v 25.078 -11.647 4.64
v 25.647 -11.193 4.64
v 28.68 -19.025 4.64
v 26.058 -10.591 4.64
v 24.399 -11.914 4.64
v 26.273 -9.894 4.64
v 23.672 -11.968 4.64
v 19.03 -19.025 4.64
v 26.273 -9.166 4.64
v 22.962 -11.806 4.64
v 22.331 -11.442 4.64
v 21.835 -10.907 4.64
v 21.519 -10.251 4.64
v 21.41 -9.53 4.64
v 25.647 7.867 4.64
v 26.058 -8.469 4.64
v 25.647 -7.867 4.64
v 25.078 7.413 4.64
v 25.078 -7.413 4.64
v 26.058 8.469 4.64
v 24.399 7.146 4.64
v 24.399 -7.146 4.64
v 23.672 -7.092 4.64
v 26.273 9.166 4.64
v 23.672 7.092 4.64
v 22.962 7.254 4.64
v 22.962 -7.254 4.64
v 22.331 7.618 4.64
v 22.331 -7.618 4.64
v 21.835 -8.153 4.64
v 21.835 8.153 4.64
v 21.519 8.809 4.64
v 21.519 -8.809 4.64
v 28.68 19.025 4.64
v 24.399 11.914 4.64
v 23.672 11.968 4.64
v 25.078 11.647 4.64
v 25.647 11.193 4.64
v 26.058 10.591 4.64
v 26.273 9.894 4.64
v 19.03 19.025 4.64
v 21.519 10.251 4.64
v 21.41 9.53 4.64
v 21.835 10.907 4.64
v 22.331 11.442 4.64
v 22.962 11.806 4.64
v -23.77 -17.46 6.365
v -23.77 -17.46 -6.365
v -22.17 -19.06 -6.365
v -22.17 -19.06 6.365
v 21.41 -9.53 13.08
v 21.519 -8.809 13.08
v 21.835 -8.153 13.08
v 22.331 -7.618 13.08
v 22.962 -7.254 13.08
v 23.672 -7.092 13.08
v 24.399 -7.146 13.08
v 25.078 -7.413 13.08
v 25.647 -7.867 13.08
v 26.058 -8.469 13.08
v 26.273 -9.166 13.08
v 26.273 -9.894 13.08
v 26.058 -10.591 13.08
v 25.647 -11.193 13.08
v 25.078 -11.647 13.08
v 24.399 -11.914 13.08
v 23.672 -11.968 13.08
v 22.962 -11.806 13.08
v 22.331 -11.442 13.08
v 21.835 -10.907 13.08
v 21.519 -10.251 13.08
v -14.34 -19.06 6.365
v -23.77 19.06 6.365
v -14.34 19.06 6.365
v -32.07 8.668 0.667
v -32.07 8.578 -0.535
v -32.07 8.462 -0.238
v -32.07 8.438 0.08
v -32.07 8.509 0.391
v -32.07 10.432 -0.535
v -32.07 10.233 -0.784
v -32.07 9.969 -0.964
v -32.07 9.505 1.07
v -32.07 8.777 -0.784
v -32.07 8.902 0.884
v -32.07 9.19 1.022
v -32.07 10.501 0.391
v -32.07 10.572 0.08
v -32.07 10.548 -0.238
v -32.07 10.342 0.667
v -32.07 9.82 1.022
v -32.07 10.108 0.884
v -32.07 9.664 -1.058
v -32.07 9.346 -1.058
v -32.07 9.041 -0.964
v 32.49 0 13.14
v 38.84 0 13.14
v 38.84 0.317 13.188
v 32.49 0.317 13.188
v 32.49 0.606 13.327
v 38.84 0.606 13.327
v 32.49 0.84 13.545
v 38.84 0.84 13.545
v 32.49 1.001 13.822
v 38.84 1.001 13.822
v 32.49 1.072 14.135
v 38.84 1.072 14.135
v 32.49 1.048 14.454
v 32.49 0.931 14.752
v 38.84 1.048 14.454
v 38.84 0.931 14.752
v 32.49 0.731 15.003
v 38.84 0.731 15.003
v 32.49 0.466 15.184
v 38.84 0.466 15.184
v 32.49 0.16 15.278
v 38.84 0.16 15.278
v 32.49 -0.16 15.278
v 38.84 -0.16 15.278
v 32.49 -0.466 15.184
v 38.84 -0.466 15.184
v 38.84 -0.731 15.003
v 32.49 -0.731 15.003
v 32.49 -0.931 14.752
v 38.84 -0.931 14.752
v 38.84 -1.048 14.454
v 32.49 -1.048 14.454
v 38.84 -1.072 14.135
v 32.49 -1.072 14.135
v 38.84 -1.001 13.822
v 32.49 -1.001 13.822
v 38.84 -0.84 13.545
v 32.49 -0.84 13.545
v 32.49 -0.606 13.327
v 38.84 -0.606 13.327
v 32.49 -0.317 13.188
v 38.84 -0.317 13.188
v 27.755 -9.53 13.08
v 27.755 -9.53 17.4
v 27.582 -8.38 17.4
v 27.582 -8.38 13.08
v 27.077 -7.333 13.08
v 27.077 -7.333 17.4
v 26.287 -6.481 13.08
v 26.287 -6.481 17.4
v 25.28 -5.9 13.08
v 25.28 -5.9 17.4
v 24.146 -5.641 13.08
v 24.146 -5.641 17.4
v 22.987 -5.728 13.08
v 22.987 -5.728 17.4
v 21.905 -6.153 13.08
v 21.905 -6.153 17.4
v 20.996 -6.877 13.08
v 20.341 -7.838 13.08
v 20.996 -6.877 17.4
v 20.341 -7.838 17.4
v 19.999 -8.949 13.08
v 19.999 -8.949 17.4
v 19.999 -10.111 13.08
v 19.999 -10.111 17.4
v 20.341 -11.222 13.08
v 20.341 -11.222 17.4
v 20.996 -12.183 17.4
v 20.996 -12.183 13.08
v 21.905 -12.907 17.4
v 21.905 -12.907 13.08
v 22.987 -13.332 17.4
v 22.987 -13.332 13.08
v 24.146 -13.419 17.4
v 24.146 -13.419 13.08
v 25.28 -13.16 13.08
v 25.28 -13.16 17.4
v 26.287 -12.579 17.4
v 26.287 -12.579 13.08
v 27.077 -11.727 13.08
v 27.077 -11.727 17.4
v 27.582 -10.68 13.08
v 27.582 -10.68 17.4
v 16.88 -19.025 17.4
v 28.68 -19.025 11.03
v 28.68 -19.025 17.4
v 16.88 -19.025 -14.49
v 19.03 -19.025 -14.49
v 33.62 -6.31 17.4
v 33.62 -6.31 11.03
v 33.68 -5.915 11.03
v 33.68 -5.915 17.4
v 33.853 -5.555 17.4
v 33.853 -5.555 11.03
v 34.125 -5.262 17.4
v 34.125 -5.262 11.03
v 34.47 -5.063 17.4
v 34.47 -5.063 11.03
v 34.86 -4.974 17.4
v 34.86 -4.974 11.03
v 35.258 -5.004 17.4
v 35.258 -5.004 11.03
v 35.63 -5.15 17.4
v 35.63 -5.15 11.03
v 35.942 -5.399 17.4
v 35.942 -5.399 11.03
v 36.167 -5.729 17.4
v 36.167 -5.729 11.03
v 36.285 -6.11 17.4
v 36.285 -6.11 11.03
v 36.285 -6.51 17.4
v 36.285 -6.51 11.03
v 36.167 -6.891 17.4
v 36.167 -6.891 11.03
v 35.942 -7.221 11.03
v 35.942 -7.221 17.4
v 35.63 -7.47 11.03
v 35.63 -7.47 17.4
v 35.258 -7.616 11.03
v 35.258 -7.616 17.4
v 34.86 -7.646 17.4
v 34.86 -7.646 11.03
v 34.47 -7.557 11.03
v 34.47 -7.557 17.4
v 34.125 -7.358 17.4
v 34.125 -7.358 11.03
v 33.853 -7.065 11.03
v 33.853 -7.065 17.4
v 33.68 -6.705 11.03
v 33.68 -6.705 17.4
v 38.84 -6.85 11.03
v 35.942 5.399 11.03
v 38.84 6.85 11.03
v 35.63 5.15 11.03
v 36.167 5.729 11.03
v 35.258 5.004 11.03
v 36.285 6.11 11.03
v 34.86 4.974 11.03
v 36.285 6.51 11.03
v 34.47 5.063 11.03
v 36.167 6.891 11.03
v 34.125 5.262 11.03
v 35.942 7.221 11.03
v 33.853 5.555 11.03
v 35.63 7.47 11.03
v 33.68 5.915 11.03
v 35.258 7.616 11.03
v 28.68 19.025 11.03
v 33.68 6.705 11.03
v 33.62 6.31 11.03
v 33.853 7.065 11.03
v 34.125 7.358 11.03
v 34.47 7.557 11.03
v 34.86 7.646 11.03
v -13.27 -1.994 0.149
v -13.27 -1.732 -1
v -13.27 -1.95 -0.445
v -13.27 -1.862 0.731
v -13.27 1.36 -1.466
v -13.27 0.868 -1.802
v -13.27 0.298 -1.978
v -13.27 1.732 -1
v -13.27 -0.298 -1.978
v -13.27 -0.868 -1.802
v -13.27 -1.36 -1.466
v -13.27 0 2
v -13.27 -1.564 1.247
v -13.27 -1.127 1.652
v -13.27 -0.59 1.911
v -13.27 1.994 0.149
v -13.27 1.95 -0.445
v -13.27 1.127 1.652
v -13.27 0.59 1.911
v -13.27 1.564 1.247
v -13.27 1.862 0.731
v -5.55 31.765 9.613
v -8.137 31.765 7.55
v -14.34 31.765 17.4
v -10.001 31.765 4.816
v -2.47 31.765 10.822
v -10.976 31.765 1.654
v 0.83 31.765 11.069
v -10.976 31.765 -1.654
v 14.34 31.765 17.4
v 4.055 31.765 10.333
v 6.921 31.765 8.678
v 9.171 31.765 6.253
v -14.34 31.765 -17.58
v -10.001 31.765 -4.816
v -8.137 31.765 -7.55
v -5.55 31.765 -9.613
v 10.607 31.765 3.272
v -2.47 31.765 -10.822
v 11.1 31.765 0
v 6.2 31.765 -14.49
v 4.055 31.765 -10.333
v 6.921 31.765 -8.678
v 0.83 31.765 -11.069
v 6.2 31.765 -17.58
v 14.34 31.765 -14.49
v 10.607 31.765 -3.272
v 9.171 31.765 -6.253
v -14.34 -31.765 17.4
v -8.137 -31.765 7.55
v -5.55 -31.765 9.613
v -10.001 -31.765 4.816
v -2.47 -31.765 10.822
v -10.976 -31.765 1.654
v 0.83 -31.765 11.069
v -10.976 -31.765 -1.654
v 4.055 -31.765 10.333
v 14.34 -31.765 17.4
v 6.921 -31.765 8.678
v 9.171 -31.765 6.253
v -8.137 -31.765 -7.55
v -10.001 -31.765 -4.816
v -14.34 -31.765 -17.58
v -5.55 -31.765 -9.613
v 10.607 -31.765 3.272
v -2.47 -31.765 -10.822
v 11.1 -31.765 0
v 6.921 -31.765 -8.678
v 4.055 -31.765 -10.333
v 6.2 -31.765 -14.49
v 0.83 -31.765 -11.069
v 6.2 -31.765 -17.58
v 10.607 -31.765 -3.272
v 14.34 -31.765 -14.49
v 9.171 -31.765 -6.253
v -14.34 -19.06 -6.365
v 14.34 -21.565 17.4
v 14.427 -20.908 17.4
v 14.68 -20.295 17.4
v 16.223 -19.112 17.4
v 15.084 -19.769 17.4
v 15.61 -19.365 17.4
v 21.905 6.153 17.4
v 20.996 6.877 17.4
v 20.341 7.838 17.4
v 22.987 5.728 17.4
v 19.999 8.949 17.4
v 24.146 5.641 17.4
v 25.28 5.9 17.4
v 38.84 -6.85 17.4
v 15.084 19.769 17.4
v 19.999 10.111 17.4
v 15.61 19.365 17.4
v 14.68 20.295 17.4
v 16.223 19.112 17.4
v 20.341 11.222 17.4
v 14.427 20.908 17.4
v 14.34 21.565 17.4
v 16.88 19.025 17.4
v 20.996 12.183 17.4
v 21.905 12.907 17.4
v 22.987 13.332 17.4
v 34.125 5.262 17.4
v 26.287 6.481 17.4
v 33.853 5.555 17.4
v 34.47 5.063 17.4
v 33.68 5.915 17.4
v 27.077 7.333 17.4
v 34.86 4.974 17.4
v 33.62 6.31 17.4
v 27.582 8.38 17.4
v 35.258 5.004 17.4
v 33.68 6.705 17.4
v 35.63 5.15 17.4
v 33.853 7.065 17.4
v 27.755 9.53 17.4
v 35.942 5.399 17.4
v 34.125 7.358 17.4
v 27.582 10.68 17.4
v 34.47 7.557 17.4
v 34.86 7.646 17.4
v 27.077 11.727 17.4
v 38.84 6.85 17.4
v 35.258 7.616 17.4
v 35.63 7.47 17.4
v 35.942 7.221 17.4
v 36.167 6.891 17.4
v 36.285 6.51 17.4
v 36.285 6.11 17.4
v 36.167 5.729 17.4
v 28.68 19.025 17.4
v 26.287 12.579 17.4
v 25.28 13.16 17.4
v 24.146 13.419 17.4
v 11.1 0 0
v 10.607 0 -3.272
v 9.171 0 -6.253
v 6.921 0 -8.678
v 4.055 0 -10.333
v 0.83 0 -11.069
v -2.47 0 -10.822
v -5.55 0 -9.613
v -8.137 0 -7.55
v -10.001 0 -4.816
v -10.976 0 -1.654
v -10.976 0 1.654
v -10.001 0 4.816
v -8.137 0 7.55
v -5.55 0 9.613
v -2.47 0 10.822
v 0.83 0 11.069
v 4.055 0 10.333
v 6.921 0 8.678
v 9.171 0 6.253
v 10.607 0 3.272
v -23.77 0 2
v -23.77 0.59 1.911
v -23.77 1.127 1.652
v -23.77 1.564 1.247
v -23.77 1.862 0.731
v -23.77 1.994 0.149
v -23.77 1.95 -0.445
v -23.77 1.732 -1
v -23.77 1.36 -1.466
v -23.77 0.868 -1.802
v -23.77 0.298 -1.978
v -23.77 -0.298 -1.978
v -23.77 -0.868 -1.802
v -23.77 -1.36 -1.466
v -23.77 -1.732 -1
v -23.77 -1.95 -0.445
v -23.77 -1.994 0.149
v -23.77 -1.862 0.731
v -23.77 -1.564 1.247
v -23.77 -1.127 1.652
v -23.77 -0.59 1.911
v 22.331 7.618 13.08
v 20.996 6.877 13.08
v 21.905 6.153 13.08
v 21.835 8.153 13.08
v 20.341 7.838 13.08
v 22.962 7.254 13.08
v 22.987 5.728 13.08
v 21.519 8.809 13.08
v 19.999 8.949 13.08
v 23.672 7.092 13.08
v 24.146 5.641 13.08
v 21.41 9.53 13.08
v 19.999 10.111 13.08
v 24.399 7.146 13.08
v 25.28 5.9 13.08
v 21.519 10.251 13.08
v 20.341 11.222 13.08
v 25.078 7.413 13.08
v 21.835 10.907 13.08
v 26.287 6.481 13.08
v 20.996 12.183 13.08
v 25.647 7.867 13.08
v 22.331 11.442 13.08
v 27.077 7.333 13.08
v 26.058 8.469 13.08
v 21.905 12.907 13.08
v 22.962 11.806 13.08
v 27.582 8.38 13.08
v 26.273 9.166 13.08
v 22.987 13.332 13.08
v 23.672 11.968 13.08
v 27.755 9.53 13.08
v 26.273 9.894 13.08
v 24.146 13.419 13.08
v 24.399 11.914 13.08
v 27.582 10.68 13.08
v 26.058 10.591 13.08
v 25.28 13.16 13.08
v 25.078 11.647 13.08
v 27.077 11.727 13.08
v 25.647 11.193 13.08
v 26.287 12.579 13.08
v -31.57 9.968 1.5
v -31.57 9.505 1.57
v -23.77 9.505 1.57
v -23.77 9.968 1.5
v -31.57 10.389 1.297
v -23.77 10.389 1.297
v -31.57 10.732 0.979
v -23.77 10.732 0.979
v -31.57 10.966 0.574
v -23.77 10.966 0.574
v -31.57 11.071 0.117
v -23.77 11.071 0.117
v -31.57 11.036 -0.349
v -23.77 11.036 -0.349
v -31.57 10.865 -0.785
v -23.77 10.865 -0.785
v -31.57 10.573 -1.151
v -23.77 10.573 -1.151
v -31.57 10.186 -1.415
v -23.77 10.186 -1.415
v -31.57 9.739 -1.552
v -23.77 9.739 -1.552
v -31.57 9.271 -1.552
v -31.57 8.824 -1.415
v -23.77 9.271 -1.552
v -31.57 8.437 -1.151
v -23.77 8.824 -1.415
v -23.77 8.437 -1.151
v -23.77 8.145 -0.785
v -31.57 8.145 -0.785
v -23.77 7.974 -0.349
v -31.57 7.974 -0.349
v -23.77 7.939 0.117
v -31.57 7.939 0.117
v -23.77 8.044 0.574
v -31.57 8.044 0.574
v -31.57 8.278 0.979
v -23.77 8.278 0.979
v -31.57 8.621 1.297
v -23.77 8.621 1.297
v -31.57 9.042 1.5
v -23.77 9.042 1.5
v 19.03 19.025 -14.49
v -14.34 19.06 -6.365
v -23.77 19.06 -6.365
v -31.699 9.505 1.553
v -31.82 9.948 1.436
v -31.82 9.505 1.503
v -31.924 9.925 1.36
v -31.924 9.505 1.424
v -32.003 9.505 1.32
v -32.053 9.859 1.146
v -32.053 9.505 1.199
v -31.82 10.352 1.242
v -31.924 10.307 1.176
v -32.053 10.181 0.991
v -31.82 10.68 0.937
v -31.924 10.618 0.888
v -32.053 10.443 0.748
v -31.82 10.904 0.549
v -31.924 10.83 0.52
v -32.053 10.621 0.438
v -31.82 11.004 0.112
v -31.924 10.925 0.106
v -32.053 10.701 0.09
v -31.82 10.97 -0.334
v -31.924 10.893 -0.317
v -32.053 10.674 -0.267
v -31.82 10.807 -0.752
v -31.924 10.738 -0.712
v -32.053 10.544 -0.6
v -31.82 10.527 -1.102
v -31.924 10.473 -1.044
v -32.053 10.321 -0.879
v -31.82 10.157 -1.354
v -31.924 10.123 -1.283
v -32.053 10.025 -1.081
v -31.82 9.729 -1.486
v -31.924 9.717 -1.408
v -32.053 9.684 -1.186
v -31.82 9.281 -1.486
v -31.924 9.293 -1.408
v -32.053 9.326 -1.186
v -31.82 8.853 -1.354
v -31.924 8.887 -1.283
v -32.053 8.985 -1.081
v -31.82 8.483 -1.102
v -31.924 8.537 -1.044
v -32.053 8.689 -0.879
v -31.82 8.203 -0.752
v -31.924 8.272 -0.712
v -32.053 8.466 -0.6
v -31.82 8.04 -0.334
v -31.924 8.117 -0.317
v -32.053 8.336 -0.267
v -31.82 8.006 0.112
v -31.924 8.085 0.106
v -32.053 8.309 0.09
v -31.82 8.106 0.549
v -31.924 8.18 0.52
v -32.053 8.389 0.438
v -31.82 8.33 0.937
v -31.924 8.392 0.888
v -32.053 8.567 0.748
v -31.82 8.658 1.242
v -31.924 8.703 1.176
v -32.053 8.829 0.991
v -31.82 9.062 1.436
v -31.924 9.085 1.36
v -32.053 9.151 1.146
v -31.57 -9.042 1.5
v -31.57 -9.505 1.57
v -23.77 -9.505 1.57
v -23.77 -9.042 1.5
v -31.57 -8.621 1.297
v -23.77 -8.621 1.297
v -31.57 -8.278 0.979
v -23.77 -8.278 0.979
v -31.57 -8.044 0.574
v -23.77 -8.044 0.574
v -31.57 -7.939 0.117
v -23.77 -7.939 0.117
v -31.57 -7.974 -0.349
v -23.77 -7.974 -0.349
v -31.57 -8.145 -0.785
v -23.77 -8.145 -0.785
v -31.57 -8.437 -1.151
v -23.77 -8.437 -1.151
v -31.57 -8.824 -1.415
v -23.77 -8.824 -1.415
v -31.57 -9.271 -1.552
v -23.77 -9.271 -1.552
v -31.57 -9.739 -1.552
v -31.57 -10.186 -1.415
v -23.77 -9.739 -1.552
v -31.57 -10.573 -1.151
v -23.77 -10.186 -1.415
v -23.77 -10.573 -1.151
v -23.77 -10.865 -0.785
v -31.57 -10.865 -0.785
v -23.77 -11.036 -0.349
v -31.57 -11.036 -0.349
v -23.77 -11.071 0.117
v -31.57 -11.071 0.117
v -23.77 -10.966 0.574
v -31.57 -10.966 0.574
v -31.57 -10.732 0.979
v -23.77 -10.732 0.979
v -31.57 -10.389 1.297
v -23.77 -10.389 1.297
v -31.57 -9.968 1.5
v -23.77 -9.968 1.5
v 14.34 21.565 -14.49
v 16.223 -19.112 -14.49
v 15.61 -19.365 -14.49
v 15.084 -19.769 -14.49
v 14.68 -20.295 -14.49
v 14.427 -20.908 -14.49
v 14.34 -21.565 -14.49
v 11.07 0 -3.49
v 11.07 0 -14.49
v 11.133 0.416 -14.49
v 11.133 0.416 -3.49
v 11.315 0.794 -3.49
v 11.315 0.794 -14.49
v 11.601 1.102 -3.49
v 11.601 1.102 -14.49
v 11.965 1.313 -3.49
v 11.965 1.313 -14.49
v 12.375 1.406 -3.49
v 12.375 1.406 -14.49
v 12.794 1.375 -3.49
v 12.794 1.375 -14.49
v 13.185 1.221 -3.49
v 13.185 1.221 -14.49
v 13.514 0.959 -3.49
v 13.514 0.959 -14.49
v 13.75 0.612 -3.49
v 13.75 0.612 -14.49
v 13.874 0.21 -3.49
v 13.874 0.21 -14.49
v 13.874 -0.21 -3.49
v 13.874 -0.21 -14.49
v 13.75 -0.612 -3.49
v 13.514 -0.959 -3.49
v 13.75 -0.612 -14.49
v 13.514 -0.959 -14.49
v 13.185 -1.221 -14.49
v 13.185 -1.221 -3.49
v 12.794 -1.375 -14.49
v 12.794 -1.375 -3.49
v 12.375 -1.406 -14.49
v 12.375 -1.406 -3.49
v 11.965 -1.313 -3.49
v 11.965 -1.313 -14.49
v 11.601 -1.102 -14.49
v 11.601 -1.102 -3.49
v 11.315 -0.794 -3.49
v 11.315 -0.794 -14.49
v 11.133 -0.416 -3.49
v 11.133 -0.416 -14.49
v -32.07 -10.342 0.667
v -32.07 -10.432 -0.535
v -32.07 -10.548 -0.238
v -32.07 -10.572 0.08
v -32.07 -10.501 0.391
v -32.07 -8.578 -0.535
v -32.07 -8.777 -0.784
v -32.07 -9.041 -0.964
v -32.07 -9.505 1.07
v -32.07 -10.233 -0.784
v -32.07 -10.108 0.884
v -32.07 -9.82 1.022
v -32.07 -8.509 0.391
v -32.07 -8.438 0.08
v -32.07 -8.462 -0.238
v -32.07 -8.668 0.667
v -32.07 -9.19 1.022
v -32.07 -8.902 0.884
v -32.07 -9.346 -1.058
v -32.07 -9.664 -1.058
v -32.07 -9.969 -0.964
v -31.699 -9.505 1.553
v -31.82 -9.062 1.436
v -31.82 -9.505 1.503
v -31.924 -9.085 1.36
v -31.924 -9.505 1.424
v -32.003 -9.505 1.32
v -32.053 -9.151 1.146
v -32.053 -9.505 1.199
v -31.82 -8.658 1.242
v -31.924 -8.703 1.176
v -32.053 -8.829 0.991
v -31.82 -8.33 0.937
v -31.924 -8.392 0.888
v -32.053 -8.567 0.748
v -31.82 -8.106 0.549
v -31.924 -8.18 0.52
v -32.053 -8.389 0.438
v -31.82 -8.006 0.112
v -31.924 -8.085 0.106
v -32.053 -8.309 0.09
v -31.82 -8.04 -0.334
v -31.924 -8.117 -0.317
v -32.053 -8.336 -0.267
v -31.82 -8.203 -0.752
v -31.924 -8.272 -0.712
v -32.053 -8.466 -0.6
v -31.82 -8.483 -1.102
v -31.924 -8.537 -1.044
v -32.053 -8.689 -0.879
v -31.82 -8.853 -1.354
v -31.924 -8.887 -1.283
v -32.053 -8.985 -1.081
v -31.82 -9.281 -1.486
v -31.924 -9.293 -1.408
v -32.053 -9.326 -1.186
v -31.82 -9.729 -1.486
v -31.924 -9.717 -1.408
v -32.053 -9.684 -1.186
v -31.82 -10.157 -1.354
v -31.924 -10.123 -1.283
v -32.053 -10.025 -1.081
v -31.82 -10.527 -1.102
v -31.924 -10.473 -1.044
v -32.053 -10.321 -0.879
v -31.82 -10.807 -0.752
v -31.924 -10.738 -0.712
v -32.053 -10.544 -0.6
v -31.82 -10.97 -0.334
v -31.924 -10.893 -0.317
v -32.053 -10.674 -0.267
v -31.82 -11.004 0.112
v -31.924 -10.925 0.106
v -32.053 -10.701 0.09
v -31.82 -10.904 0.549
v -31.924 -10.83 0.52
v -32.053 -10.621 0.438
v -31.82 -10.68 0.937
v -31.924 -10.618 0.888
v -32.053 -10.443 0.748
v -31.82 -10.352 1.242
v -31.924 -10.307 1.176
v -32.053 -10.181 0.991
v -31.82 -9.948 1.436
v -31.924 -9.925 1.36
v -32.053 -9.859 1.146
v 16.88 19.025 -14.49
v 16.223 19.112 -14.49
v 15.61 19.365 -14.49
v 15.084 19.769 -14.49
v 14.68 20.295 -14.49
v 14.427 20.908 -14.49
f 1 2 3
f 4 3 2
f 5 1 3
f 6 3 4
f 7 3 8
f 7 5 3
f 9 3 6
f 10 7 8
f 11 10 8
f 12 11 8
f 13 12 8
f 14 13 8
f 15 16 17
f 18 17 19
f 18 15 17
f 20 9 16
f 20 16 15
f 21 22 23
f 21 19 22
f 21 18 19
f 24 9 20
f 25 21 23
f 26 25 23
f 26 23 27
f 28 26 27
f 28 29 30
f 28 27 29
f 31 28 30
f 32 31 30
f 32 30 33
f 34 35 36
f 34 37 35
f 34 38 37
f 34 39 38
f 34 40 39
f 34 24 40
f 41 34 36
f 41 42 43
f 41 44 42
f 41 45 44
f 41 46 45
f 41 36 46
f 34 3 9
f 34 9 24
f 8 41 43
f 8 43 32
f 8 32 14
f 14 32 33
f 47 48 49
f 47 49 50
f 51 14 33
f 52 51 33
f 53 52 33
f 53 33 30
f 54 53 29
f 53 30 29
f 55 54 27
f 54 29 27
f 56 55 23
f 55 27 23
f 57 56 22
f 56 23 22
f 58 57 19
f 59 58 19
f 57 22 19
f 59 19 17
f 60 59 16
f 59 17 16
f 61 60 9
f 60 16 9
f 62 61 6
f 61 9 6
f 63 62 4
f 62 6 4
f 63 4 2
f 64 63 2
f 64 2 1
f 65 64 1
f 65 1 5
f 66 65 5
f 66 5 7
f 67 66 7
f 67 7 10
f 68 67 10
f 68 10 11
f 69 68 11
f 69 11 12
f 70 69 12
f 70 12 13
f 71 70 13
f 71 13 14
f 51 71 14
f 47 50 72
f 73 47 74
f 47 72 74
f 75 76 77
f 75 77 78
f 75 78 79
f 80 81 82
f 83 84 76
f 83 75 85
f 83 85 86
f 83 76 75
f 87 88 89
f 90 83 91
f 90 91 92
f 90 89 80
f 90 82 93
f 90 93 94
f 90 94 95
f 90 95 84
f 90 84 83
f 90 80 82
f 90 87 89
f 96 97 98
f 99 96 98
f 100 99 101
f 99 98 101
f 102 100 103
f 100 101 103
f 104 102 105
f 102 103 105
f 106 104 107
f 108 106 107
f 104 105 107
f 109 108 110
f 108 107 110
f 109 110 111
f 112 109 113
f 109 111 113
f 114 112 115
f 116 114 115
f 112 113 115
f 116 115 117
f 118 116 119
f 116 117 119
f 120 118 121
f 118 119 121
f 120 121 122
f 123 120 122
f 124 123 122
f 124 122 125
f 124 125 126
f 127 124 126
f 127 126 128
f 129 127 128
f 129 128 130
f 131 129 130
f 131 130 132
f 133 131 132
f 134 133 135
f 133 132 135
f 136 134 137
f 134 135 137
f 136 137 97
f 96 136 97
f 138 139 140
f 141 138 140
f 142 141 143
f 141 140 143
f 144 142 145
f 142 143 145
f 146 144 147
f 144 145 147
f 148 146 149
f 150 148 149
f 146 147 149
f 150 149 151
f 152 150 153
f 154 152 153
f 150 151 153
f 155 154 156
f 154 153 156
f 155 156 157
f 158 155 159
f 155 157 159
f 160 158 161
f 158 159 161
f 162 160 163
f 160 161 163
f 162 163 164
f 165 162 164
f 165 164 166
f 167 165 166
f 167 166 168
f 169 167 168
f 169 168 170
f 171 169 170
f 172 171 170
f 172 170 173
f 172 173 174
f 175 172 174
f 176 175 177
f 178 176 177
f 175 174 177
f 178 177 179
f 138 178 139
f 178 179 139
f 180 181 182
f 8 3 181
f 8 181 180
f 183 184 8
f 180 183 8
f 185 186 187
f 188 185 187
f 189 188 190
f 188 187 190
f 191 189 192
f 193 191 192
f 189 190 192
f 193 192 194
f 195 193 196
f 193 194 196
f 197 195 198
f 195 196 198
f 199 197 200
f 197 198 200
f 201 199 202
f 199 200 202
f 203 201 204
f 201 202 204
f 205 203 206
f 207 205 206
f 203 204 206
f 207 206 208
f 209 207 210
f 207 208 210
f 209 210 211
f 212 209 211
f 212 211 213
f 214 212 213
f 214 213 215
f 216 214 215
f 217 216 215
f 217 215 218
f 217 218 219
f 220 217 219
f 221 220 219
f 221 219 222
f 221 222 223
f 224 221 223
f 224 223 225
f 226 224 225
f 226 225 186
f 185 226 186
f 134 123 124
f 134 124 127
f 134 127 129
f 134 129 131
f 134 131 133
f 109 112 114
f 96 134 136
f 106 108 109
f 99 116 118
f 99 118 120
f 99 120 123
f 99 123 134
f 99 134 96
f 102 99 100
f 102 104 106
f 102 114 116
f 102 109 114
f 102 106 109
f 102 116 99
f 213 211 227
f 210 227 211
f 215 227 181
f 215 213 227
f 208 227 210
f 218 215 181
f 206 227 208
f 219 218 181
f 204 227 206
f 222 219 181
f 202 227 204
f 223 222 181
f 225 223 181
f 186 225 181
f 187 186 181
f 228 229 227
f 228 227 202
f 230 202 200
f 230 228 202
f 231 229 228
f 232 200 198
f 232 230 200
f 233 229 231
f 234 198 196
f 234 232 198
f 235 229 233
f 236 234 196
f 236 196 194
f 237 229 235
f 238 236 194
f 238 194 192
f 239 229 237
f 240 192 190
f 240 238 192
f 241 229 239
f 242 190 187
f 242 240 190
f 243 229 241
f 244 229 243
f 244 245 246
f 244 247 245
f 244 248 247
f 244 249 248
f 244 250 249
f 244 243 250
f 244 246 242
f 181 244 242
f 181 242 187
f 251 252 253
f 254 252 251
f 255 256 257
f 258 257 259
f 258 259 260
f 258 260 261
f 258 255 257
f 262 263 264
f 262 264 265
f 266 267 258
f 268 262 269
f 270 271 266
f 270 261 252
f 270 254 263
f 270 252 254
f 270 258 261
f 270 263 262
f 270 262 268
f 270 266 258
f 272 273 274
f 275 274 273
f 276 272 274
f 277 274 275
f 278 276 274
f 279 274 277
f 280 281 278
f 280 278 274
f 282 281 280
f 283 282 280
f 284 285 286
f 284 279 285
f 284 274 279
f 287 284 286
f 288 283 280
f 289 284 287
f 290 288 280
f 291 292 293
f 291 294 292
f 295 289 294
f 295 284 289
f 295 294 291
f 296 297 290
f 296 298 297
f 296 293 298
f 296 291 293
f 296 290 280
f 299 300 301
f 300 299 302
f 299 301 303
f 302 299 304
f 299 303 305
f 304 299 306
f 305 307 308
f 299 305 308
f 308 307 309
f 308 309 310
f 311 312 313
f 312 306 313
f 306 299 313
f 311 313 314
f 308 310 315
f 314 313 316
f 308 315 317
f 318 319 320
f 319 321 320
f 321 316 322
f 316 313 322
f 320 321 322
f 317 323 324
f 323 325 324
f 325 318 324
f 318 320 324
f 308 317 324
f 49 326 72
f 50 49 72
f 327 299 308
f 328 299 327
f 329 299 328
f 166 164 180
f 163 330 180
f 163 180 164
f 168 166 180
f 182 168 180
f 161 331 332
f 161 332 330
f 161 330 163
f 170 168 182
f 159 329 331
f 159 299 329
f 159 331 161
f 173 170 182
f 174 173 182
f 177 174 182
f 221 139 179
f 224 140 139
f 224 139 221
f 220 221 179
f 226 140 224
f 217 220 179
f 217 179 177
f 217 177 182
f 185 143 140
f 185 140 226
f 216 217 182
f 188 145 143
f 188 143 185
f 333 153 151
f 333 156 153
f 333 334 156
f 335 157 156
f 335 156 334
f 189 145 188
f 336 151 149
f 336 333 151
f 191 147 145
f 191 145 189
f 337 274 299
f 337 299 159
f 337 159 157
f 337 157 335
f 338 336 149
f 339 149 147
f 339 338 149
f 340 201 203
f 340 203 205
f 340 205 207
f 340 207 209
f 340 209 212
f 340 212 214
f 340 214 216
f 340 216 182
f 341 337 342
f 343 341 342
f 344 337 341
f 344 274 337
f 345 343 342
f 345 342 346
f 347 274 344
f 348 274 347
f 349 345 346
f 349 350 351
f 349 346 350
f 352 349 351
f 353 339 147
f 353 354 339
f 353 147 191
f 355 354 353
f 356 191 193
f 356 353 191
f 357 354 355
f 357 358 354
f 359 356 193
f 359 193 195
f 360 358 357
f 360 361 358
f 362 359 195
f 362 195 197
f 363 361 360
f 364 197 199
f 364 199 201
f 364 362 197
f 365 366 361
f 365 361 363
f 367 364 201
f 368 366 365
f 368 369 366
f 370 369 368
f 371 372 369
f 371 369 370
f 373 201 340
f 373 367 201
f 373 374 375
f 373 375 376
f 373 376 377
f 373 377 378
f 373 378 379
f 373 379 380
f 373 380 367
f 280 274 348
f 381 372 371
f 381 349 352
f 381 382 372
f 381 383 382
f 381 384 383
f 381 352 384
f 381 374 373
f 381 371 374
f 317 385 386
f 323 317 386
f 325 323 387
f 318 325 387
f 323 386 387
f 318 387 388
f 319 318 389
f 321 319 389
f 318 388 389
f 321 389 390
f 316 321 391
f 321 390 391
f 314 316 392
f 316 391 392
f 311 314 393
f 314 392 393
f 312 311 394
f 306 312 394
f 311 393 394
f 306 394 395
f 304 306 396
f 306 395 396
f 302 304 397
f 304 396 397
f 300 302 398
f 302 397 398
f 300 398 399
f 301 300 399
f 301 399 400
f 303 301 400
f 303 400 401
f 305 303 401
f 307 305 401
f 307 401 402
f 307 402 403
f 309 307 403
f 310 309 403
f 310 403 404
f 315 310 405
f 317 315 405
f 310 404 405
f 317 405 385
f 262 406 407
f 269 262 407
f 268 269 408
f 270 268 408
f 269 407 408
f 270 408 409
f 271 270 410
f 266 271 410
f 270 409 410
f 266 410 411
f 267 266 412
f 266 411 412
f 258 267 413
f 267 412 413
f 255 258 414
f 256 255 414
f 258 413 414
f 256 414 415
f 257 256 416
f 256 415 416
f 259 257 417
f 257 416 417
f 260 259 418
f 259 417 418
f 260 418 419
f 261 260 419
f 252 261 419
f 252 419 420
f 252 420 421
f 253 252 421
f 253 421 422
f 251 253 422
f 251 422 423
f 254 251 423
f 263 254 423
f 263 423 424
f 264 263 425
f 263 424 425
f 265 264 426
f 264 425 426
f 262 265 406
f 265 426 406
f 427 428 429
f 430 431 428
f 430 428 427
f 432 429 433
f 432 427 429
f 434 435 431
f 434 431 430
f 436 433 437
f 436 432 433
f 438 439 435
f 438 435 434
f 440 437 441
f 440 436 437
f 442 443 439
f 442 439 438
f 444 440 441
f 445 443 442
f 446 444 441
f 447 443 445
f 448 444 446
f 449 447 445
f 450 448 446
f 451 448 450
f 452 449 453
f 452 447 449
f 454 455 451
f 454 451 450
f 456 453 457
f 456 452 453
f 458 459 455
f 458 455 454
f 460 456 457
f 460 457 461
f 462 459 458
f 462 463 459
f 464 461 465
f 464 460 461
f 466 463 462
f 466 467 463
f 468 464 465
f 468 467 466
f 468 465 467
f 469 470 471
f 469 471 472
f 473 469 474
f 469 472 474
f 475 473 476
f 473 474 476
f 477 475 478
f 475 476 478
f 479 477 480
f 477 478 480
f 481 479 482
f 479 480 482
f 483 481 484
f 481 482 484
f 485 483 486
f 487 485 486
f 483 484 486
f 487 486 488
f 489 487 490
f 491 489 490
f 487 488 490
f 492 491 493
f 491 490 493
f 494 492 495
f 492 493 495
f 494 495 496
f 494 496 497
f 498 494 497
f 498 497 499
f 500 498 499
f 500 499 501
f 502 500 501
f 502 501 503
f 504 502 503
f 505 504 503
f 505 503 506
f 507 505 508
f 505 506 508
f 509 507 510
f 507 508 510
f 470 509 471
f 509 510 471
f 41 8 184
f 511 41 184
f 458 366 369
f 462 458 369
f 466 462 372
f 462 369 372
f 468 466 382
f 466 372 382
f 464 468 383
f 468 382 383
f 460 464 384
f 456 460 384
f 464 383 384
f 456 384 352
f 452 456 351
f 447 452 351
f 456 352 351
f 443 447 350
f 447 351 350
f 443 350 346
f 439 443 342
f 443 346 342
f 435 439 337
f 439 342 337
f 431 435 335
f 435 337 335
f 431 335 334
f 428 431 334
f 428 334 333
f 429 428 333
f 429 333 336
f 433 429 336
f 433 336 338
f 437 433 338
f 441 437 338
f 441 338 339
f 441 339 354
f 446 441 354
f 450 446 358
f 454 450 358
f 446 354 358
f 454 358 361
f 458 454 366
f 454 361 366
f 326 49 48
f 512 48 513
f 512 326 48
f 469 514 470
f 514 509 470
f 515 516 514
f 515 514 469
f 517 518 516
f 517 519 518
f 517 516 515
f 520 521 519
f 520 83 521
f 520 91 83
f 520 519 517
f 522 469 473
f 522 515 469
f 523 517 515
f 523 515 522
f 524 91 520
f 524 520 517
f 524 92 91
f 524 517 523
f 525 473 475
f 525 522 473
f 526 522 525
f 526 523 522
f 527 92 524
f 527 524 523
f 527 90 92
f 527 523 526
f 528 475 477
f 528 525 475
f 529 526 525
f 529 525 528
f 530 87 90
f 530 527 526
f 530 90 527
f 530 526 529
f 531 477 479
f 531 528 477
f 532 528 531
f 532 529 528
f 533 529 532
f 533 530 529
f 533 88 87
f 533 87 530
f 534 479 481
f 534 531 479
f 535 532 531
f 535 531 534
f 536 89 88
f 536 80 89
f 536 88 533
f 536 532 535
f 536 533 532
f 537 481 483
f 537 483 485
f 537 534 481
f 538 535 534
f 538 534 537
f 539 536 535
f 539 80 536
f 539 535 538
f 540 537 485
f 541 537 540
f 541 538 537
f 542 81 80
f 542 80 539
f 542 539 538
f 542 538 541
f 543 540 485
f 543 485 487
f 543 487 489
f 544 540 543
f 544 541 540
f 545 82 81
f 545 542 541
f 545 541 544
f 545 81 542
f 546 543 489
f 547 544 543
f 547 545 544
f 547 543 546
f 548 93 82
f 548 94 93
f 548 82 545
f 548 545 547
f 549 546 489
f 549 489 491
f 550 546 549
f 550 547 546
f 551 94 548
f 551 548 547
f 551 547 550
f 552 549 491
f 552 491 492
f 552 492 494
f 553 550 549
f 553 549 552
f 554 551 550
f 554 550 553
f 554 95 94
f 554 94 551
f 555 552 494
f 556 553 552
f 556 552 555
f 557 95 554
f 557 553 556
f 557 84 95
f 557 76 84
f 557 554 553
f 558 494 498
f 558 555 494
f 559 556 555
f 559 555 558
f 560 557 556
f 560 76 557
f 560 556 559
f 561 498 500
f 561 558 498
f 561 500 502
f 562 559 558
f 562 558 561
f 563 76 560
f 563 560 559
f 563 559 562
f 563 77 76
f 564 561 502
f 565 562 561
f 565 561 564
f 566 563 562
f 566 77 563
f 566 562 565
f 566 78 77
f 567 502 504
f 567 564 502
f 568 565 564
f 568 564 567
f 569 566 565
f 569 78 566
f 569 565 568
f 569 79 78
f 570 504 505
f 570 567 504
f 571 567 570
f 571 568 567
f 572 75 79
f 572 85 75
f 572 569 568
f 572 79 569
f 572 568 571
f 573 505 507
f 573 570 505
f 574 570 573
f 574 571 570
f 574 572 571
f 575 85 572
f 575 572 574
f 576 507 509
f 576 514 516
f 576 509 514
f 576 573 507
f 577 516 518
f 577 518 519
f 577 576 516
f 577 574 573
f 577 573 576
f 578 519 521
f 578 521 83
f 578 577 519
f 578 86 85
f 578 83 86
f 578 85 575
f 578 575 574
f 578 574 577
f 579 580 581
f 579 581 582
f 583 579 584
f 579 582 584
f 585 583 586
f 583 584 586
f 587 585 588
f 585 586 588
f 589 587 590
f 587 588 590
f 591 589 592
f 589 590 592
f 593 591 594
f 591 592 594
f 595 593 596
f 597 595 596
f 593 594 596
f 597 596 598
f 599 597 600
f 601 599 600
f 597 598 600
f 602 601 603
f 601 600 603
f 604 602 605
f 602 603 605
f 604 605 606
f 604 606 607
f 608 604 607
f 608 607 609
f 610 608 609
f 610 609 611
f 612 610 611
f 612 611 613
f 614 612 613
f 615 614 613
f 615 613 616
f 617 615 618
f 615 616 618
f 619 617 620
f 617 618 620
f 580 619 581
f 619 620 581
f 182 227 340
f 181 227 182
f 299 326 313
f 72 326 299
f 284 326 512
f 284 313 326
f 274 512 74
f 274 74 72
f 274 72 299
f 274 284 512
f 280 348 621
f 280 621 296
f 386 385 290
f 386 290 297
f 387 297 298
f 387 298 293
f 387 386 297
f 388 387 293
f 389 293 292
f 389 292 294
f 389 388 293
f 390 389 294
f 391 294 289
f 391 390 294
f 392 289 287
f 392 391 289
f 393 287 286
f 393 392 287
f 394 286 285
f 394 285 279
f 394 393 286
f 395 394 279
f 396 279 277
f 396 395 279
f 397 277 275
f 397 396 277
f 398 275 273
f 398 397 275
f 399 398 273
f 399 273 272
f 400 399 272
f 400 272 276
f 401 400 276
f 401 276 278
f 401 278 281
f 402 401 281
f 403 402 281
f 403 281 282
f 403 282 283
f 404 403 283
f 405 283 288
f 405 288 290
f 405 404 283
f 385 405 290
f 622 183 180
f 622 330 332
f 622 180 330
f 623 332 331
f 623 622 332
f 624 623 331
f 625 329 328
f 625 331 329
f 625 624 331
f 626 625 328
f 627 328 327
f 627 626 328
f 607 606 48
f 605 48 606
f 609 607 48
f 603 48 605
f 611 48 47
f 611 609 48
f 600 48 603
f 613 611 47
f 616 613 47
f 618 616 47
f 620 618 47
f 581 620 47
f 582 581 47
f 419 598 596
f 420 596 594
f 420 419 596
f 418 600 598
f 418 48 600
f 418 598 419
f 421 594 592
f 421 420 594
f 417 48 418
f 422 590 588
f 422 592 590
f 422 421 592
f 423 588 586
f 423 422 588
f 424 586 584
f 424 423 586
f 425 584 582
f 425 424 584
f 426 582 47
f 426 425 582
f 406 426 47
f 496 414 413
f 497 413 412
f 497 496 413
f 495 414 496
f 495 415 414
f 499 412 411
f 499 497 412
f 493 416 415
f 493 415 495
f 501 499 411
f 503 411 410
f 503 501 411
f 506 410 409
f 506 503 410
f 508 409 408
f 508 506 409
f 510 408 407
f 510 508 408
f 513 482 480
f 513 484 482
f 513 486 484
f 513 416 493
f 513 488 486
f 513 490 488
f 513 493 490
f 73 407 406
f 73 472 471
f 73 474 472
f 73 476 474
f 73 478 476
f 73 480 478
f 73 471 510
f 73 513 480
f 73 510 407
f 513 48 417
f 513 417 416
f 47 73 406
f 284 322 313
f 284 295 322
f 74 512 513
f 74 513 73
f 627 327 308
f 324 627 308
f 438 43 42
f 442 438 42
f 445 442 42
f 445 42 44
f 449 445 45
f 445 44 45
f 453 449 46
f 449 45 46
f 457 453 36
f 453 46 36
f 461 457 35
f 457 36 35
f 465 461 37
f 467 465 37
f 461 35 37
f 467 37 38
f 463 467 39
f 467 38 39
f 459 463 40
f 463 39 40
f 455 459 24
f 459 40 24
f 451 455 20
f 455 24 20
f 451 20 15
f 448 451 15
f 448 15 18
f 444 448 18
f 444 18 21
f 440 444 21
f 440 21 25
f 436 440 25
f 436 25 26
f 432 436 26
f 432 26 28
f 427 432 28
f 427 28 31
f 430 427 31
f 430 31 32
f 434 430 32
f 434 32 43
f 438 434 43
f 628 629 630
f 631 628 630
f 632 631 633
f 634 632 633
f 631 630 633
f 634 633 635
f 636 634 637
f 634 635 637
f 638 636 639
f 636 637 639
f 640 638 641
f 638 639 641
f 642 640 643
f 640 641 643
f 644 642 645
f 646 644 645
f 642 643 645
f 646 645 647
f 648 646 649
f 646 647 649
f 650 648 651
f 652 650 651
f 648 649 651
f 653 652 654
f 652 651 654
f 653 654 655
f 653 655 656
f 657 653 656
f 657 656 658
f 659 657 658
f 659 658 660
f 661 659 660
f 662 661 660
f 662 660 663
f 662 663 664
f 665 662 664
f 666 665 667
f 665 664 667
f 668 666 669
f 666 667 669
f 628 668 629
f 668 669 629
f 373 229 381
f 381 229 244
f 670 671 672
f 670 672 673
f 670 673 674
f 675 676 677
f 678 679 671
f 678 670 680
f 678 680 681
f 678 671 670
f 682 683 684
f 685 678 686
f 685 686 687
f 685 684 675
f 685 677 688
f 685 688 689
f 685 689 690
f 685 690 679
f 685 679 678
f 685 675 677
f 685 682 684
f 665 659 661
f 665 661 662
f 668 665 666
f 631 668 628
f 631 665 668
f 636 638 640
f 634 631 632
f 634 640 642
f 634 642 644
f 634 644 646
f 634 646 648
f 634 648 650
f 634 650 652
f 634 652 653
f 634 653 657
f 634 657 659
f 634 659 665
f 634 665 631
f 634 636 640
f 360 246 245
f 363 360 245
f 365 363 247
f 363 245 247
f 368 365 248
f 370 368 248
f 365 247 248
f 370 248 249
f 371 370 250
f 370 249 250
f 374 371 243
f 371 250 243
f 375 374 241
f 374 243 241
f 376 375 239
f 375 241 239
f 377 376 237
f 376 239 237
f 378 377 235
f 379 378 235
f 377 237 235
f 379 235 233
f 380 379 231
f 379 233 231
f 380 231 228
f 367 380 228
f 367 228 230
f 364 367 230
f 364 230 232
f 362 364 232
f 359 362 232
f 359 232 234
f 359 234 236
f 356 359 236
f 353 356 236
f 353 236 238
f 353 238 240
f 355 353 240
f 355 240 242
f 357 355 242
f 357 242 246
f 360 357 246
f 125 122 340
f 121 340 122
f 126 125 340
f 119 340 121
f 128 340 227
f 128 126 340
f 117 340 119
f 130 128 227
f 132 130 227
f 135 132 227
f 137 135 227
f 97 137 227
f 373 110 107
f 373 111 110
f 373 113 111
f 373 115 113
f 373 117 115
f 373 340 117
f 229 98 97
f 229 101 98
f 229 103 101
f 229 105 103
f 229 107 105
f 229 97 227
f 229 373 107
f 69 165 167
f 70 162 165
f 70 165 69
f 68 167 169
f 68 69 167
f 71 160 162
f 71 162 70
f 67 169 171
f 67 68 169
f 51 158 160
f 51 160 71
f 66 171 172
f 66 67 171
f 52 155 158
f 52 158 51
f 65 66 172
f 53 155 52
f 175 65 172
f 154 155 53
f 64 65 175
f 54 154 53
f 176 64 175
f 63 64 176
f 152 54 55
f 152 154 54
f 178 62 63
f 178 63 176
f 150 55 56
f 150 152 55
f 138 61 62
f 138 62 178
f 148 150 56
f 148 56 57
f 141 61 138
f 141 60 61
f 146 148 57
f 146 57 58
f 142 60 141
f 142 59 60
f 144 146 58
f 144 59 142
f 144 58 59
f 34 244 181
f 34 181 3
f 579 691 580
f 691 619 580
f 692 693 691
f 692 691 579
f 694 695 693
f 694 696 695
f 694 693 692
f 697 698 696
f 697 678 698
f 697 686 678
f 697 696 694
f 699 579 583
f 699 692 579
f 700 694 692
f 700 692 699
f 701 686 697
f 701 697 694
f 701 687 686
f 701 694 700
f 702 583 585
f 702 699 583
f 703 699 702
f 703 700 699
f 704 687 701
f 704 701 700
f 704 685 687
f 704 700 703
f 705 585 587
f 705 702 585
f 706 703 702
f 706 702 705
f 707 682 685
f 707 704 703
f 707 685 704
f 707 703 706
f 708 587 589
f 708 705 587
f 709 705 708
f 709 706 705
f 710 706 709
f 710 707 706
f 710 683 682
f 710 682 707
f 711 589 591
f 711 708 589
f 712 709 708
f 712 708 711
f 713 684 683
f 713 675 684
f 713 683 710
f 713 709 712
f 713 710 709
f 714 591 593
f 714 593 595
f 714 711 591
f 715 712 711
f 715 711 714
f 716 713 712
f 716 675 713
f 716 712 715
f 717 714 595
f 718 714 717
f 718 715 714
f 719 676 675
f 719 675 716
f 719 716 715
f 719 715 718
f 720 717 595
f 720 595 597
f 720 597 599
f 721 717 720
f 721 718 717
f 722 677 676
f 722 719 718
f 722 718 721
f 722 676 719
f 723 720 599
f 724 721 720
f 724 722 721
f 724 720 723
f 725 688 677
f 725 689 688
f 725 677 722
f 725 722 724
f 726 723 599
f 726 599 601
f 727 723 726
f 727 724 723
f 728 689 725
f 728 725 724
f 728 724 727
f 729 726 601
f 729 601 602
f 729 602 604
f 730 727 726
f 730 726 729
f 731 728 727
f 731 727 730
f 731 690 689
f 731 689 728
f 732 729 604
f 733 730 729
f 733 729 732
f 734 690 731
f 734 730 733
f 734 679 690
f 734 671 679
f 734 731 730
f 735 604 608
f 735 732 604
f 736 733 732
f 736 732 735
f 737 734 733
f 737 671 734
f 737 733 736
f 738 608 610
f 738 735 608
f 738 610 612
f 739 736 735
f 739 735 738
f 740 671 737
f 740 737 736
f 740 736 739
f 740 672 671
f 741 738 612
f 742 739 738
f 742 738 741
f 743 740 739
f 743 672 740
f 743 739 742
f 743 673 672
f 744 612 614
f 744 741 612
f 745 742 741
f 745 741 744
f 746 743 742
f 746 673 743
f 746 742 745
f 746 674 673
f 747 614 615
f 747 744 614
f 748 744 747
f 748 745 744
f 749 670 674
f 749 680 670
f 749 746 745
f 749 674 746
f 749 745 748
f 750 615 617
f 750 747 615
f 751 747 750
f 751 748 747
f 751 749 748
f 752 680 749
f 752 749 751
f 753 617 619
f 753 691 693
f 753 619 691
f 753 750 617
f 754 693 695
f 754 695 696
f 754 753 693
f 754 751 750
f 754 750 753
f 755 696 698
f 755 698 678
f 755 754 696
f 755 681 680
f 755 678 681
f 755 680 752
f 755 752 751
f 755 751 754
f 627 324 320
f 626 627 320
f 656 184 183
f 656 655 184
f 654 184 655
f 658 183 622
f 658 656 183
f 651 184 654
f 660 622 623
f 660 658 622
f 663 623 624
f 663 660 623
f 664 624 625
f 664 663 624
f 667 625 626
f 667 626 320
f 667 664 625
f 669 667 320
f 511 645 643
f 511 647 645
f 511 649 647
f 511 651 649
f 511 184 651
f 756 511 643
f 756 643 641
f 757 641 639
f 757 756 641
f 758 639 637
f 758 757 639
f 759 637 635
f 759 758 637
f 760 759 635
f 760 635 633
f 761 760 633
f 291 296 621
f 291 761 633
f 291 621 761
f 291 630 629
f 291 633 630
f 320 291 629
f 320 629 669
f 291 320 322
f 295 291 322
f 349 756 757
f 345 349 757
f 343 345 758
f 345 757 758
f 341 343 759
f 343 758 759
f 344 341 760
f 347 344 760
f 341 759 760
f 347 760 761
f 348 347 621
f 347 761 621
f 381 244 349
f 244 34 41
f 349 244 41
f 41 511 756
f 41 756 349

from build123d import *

# Parameters (mm, degrees)
BOSS_EXTRUDE1_DEPTH      = 31.765
BOSS_EXTRUDE1_DEPTH_BACK = 31.765
SKETCH1_R                = 11.1
SKETCH2_W                = 12.73
SKETCH2_H                = 38.12
BOSS_EXTRUDE2_DEPTH      = 9.43
CUT_EXTRUDE1_DEPTH       = 62.165032698
CHAMFER1_SIZE            = 1.6
SKETCH4_R                = 1.41
CUT_EXTRUDE2_DEPTH       = 11
SKETCH5_R                = 2.445
CUT_EXTRUDE3_DEPTH       = 55.875215034
SKETCH6_R                = 3.9
CUT_EXTRUDE4_DEPTH       = 4.32
SKETCH7_R                = 1.34
CUT_EXTRUDE5_DEPTH       = 58.75892074
SKETCH8_R                = 2
CUT_EXTRUDE6_DEPTH       = 10.5
SKETCH9_R                = 1.57
BOSS_EXTRUDE3_DEPTH      = 8.3
FILLET1_R                = 0.5
SKETCH10_R               = 1.075
CUT_EXTRUDE7_DEPTH       = 6.35


with BuildPart() as part:
    # Sketch1 → Boss-Extrude1 (new, two sides: drawn at the far end of the back side and taken through both)
    with BuildSketch(Plane(origin=(0, 0, 0), x_dir=(1, 0, 0), z_dir=(0, 1, 0)).offset(-BOSS_EXTRUDE1_DEPTH_BACK)):
        Polygon((-14.34, 17.58), (-14.34, -17.4), (38.84, -17.4), (38.84, -11.03), (28.68, -11.03), (28.68, -4.64), (19.03, -4.64), (19.03, 14.49), (14.34, 14.49), (6.2, 14.49), (6.2, 17.58), align=None)
        Circle(SKETCH1_R, mode=Mode.SUBTRACT)
    extrude(amount=BOSS_EXTRUDE1_DEPTH + BOSS_EXTRUDE1_DEPTH_BACK)

    # Sketch2 → Boss-Extrude2 (add)
    with BuildSketch(Plane.ZY.offset(14.34)):
        Rectangle(SKETCH2_W, SKETCH2_H)
    extrude(amount=BOSS_EXTRUDE2_DEPTH)

    # Sketch3 → Cut-Extrude1 (cut, through all)
    with BuildSketch(Plane(origin=(0, 0, -17.58), x_dir=(-1, 0, 0), z_dir=(0, 0, -1))):
        with BuildLine():
            Line((-38.84, 6.85), (-28.68, 19.025))
            Line((-28.68, 19.025), (-16.88, 19.025))
            ThreePointArc((-16.88, 19.025), (-15.083948776, 19.768948776), (-14.34, 21.565))
            Line((-14.34, 21.565), (-14.34, 31.765))
            Line((-14.34, 31.765), (-38.84, 31.765))
            Line((-38.84, 31.765), (-38.84, 6.85))
        make_face()
        with BuildLine():
            Line((-28.68, -19.025), (-16.88, -19.025))
            ThreePointArc((-16.88, -19.025), (-15.083948776, -19.768948776), (-14.34, -21.565))
            Line((-14.34, -21.565), (-14.34, -31.765))
            Line((-14.34, -31.765), (-38.84, -31.765))
            Line((-38.84, -31.765), (-38.84, -6.85))
            Line((-38.84, -6.85), (-28.68, -19.025))
        make_face()
    extrude(amount=-CUT_EXTRUDE1_DEPTH, mode=Mode.SUBTRACT)

    # Chamfer1
    chamfer1_edges = [part.edges().sort_by_distance(p)[0] for p in [
        (-23.77, -19.06, 0),
    ]]
    chamfer(chamfer1_edges, length=CHAMFER1_SIZE)

    # Sketch4 → Cut-Extrude2 (cut)
    with BuildSketch(Plane(origin=(0, 0, -14.49), x_dir=(-1, 0, 0), z_dir=(0, 0, -1))):
        with Locations((-12.48, 0)):
            Circle(SKETCH4_R)
    extrude(amount=-CUT_EXTRUDE2_DEPTH, mode=Mode.SUBTRACT)

    # Sketch5 → Cut-Extrude3 (cut, through all)
    with BuildSketch(Plane(origin=(0, 0, 4.64), x_dir=(-1, 0, 0), z_dir=(0, 0, -1))):
        with Locations((-23.855, -9.53)):
            Circle(SKETCH5_R)
        with Locations((-23.855, 9.53)):
            Circle(SKETCH5_R)
    extrude(amount=-CUT_EXTRUDE3_DEPTH, mode=Mode.SUBTRACT)

    # Sketch6 → Cut-Extrude4 (cut)
    with BuildSketch(Plane.XY.offset(17.4)):
        with Locations((23.855, -9.53)):
            Circle(SKETCH6_R)
        with Locations((23.855, 9.53)):
            Circle(SKETCH6_R)
    extrude(amount=-CUT_EXTRUDE4_DEPTH, mode=Mode.SUBTRACT)

    # Sketch7 → Cut-Extrude5 (cut, through all)
    with BuildSketch(Plane(origin=(0, 0, 11.03), x_dir=(-1, 0, 0), z_dir=(0, 0, -1))):
        with Locations((-34.96, 6.31)):
            Circle(SKETCH7_R)
        with Locations((-34.96, -6.31)):
            Circle(SKETCH7_R)
    extrude(amount=-CUT_EXTRUDE5_DEPTH, mode=Mode.SUBTRACT)

    # Sketch8 → Cut-Extrude6 (cut)
    with BuildSketch(Plane.ZY.offset(23.77)):
        Circle(SKETCH8_R)
    extrude(amount=-CUT_EXTRUDE6_DEPTH, mode=Mode.SUBTRACT)

    # Sketch9 → Boss-Extrude3 (add)
    with BuildSketch(Plane.ZY.offset(23.77)):
        with Locations((0, -9.505)):
            Circle(SKETCH9_R)
        with Locations((0, 9.505)):
            Circle(SKETCH9_R)
    extrude(amount=BOSS_EXTRUDE3_DEPTH)

    # Fillet1
    fillet1_edges = [part.edges().sort_by_distance(p)[0] for p in [
        (-32.07, 9.505, -1.57),
        (-32.07, -9.505, -1.57),
    ]]
    fillet(fillet1_edges, radius=FILLET1_R)

    # Sketch10 → Cut-Extrude7 (cut)
    with BuildSketch(Plane(origin=(38.84, 0, 0), x_dir=(0, 0, -1), z_dir=(1, 0, 0))):
        with Locations((-14.215, 0)):
            Circle(SKETCH10_R)
    extrude(amount=-CUT_EXTRUDE7_DEPTH, mode=Mode.SUBTRACT)


solid = part.part
